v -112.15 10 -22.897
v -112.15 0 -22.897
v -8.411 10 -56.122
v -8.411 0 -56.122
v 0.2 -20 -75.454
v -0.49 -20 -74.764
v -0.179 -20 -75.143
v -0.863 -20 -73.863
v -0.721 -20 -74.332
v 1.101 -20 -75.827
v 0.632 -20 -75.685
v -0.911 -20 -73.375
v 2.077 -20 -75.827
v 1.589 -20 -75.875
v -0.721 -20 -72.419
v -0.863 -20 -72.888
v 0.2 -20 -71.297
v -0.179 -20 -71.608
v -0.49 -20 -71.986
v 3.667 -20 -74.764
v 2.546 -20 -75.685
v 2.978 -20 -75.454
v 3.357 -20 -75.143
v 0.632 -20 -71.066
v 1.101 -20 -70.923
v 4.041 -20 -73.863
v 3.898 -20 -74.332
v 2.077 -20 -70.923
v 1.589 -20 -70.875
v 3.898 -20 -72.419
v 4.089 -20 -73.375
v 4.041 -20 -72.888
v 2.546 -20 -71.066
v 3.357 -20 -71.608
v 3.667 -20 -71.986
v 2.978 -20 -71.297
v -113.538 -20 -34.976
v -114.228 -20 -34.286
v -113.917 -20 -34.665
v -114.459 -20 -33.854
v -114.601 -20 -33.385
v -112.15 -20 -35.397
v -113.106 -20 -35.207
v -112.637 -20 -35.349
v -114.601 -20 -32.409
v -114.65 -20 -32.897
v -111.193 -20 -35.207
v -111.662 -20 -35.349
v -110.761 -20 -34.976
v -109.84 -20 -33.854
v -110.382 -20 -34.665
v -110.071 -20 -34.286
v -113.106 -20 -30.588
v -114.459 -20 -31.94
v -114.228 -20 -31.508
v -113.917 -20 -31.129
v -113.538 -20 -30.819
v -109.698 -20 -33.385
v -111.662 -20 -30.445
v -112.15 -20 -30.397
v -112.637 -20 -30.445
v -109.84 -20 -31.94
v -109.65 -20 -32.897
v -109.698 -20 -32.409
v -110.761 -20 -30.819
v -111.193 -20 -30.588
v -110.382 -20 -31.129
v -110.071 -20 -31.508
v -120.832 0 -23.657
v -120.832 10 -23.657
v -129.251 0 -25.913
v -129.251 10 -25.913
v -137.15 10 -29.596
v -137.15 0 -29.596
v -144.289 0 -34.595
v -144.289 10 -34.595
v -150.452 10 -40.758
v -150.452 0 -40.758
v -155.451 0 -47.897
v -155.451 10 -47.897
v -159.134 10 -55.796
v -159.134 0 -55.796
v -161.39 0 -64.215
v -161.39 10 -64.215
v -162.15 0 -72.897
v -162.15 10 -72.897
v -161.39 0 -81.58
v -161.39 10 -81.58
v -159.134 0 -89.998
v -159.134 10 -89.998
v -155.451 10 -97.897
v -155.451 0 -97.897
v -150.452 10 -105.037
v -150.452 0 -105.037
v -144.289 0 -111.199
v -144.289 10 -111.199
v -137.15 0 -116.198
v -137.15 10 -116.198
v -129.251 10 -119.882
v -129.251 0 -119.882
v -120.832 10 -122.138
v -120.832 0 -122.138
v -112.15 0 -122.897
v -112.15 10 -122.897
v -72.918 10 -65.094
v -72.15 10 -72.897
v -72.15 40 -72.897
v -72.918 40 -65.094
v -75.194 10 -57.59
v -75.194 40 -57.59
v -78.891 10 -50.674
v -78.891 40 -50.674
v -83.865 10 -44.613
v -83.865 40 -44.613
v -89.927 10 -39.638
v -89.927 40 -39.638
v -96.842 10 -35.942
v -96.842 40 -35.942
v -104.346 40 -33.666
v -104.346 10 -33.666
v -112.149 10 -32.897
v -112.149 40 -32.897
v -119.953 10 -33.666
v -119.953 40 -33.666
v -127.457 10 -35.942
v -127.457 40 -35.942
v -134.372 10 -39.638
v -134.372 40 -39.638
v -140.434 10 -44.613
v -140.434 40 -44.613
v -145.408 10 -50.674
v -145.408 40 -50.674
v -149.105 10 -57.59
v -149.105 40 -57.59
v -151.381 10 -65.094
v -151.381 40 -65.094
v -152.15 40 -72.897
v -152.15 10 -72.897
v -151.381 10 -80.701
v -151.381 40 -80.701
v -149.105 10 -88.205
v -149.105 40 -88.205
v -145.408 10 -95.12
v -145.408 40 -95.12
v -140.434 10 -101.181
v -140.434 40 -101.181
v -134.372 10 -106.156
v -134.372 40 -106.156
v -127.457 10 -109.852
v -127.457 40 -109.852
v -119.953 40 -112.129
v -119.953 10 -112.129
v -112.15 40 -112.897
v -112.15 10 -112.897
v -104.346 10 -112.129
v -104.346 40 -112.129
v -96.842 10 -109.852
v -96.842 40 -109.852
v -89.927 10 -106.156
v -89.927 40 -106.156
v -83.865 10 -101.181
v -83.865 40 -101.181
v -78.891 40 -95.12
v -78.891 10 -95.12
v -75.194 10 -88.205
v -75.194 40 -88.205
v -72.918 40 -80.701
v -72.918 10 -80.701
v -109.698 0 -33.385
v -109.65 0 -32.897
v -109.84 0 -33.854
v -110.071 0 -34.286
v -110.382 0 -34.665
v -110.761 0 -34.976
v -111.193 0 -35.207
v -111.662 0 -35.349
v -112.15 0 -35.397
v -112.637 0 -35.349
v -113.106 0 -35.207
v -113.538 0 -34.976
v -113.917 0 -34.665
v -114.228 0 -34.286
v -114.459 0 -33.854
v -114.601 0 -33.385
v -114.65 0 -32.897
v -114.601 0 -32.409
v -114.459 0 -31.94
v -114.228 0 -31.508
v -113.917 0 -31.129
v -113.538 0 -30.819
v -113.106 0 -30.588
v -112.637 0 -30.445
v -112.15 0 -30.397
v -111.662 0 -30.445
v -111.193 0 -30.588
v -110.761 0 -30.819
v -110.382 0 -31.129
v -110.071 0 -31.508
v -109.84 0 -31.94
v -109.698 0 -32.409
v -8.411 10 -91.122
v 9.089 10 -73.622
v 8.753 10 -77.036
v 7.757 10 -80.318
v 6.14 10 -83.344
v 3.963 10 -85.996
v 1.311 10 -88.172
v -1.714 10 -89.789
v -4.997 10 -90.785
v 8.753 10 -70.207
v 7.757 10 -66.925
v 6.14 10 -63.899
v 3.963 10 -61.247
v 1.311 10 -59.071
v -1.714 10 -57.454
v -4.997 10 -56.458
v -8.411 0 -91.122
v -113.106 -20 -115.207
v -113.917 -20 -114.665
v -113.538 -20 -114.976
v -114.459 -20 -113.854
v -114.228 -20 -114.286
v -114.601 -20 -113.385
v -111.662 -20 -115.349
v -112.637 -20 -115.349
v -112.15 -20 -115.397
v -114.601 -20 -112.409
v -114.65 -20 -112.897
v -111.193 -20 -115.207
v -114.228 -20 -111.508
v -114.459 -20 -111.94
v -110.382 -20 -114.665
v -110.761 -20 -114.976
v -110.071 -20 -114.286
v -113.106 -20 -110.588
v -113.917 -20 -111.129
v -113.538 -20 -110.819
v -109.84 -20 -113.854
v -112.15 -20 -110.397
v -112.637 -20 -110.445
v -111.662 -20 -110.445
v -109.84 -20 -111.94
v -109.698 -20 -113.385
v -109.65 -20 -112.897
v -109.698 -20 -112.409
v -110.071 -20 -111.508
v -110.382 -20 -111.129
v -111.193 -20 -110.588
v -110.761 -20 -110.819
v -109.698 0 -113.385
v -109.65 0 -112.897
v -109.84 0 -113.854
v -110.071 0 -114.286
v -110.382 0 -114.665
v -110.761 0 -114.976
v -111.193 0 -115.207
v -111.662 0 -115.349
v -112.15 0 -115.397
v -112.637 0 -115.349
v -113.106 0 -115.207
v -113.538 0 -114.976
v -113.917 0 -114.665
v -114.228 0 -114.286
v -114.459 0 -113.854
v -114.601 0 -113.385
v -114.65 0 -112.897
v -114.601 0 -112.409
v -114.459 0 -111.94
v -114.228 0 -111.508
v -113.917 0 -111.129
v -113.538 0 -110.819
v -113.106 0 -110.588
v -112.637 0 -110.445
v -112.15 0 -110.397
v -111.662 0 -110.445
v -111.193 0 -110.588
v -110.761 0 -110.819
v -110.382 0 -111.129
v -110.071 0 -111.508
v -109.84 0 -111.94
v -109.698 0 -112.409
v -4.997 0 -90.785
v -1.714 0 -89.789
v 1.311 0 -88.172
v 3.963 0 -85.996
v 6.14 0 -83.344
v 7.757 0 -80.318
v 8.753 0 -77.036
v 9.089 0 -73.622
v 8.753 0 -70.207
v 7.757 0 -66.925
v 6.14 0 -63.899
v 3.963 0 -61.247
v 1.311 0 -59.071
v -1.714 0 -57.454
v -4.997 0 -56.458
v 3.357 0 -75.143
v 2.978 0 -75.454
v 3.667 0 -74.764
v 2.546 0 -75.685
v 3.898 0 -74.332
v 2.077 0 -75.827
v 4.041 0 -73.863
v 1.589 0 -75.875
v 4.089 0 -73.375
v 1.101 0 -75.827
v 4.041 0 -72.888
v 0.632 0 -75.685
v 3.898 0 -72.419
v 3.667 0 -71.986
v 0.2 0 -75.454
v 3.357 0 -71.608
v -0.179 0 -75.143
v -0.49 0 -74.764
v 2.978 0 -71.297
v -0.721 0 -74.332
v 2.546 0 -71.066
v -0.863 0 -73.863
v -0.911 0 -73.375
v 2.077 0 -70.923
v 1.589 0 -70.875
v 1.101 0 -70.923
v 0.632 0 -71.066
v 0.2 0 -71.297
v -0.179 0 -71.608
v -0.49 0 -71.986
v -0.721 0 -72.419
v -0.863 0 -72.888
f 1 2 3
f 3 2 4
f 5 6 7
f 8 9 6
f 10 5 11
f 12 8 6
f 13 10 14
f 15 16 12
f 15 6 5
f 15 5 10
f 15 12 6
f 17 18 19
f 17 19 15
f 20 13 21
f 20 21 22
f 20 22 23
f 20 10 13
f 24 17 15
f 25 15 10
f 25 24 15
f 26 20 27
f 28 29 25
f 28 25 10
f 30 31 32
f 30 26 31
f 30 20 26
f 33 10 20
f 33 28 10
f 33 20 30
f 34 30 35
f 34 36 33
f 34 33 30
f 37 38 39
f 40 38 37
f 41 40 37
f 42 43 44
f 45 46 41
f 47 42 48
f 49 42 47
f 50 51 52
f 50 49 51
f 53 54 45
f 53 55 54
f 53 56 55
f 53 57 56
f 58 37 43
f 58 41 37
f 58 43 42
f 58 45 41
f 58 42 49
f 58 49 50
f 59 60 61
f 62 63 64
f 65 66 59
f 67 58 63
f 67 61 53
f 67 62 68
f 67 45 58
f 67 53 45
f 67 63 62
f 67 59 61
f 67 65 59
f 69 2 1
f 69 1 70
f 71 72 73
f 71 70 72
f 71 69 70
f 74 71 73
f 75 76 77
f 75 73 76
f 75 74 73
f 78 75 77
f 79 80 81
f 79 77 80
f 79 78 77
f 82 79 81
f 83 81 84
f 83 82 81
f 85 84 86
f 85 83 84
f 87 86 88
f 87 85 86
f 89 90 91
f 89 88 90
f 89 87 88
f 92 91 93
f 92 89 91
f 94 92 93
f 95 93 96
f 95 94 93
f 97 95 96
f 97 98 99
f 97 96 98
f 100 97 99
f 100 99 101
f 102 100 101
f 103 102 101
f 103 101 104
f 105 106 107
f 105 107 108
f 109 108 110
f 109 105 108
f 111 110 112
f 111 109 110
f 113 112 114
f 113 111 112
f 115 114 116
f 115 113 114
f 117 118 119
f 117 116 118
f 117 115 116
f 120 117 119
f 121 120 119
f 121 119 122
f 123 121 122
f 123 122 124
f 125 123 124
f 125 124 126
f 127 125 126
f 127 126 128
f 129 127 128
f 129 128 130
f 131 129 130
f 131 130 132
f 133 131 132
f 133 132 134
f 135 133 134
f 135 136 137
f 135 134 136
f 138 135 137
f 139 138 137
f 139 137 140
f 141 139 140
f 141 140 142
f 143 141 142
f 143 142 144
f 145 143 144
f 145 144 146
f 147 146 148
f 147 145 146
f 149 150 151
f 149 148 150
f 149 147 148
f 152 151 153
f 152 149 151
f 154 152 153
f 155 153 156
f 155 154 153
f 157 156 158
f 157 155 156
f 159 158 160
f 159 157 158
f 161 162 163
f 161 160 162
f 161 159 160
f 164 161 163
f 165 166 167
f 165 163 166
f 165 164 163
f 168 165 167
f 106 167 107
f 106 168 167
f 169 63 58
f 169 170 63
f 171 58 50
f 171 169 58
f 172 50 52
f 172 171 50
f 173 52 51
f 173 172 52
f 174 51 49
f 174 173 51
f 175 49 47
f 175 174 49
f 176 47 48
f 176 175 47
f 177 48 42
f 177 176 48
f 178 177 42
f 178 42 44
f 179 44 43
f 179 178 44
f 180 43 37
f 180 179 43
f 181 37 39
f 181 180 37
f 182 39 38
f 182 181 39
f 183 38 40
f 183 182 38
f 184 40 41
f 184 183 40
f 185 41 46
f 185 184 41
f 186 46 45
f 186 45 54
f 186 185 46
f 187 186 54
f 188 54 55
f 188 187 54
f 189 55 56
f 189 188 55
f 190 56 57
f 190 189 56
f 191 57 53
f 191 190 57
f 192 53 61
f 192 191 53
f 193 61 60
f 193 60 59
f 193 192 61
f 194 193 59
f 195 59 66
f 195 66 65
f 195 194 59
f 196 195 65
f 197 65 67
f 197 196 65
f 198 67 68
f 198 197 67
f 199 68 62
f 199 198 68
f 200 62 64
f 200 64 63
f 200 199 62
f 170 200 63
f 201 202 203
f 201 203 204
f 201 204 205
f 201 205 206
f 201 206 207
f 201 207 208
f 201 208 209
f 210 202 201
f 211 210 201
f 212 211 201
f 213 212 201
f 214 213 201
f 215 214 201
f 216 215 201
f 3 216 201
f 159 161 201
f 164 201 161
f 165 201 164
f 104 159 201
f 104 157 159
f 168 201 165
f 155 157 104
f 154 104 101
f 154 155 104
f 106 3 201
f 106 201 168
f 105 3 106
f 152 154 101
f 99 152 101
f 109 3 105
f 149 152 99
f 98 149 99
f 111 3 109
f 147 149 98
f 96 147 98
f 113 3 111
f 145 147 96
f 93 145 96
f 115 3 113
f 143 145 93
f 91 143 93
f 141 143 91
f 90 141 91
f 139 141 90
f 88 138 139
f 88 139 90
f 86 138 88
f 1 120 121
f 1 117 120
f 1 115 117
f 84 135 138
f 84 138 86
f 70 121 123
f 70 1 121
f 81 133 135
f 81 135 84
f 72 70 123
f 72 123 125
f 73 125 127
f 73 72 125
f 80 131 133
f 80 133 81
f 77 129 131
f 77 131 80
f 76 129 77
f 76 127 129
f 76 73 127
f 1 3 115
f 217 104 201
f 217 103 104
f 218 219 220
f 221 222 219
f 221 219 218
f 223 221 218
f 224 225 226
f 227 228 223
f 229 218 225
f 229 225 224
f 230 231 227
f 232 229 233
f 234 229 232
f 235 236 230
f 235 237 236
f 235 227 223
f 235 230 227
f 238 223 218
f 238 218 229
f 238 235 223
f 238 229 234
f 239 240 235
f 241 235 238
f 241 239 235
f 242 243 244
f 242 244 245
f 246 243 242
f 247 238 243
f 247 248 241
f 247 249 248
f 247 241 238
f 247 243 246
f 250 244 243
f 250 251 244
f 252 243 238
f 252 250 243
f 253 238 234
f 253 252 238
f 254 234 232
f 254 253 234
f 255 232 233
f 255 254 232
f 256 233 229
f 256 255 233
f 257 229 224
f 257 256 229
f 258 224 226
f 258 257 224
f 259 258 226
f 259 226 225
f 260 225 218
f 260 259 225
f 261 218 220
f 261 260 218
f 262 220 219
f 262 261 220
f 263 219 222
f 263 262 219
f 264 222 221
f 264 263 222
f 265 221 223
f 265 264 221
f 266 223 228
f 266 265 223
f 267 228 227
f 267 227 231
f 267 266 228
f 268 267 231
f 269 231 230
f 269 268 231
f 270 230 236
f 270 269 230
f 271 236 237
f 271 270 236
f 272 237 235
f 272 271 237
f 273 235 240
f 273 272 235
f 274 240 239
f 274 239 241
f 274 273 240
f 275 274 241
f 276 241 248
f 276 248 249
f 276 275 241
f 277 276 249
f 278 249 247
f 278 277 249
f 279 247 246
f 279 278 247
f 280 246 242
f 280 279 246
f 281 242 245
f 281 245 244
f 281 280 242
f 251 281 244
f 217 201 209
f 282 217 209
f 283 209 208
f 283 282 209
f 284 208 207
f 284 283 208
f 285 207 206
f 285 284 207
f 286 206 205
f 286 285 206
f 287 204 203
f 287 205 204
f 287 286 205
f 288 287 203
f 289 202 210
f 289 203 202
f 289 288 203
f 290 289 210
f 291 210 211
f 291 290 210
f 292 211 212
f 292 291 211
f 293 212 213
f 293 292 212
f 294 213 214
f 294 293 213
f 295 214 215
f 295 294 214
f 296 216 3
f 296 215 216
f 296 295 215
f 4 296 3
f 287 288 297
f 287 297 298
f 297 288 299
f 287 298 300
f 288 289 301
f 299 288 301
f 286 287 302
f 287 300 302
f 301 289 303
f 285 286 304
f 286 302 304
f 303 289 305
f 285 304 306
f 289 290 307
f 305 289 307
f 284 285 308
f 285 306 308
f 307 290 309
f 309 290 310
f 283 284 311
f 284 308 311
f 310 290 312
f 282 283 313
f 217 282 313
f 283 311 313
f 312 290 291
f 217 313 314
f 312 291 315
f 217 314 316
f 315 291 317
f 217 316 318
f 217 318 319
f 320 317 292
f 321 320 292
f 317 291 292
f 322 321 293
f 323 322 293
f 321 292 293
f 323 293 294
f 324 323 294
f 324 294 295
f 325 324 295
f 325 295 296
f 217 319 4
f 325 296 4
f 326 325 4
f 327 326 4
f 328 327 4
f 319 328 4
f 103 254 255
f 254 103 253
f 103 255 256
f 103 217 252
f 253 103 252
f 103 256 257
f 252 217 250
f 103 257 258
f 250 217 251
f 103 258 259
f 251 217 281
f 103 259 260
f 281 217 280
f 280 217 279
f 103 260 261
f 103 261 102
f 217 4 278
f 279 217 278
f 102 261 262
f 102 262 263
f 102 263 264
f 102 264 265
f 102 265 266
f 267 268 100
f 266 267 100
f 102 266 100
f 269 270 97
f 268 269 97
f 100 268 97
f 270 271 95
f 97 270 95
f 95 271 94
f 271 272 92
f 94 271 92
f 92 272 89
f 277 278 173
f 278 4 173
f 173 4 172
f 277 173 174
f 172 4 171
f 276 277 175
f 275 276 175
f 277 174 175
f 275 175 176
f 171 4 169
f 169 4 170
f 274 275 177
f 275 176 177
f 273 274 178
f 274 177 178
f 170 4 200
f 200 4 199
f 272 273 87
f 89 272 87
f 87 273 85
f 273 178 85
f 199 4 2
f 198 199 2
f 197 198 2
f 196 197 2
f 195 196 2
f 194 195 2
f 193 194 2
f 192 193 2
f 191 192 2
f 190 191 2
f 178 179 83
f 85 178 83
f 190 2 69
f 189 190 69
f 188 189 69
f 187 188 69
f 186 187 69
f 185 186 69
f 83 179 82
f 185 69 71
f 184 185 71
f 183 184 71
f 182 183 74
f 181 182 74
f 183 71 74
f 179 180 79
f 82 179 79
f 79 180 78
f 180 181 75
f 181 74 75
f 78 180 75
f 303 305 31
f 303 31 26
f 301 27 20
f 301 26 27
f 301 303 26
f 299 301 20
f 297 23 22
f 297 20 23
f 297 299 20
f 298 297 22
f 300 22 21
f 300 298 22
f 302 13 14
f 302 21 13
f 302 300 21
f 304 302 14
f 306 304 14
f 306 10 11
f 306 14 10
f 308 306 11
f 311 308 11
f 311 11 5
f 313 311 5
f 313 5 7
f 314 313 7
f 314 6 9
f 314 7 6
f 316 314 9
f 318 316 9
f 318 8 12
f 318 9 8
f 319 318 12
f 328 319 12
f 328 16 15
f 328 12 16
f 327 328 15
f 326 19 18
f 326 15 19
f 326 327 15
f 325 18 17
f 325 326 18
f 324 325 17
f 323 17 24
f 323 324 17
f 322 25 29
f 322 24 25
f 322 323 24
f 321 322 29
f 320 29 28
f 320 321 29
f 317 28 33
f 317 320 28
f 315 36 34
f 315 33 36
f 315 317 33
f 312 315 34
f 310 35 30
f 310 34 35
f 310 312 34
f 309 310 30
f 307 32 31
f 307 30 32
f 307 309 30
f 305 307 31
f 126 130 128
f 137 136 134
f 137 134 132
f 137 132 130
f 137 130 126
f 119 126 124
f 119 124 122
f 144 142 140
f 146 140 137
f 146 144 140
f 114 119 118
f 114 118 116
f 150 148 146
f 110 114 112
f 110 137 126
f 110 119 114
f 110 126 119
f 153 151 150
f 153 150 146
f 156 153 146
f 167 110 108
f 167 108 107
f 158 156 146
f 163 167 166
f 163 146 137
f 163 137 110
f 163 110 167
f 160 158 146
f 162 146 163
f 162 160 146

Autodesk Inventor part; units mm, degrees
ref_plane "YZ Plane" through (0, 0, 0) normal (1, 0, 0) x (0, 1, 0)
ref_plane "XZ Plane" through (0, 0, 0) normal (0, 1, 0) x (-1, 0, 0)
ref_plane "XY Plane" through (0, 0, 0) normal (0, 0, 1) x (1, 0, 0)
sketch "Skizze1" plane through (0, 0, 0) normal (0, 1, 0) x (-1, 0, 0)
  arc A0 (112.1495, -122.8972) -> (112.1495, -22.8972) centre (112.1495, -72.8972) ccw
  circle A1 centre (8.4112, -73.6215) radius 17.5
  line L0 (112.1495, -122.8972) -> (8.4112, -91.1215)
  line L1 (112.1495, -22.8972) -> (8.4112, -56.1215)
  point P0 (0, 0)
  dimension "d0" = 50
  dimension "d1" = 35
extrude "Extrusion1" add sketch "Skizze1" along normal blind 10
sketch "Skizze2" plane through (0, 10, 0) normal (0, 1, 0) x (1, 0, 0)
  arc A0 (-112.1495, 122.8972) -> (-112.1495, 22.8972) centre (-112.1495, 72.8972) ccw projected
  circle A1 centre (-112.1495, 72.8972) radius 40
  point P0 (0, 0)
  dimension "d4" = 80
extrude "Extrusion2" add sketch "Skizze2" along normal blind 30
sketch "Skizze3" plane through (0, 0, 0) normal (0, -1, 0) x (1, 0, 0)
  circle A0 centre (-112.1495, -112.8972) radius 2.5
  circle A1 centre (-112.1495, -32.8972) radius 2.5
  circle A2 centre (1.5888, -73.3753) radius 2.5
  arc A3 (-8.4112, -91.1215) -> (-8.4112, -56.1215) centre (-8.4112, -73.6215) ccw projected
  circle A4 centre (-112.1495, -72.8972) radius 40 projected
  point P0 (0, 0)
  dimension "d7" = 5
  dimension "d8" = 5
  dimension "d9" = 5
  dimension "d10" = 10
  dimension "d11" = 40
  dimension "d12" = 0
  dimension "d13" = 40
extrude "Extrusion3" add sketch "Skizze3" along normal blind 20 contours A0 A4 | A4 A0 | A4 A1 | A1 A4 | A2
properties part number "Sensor"
